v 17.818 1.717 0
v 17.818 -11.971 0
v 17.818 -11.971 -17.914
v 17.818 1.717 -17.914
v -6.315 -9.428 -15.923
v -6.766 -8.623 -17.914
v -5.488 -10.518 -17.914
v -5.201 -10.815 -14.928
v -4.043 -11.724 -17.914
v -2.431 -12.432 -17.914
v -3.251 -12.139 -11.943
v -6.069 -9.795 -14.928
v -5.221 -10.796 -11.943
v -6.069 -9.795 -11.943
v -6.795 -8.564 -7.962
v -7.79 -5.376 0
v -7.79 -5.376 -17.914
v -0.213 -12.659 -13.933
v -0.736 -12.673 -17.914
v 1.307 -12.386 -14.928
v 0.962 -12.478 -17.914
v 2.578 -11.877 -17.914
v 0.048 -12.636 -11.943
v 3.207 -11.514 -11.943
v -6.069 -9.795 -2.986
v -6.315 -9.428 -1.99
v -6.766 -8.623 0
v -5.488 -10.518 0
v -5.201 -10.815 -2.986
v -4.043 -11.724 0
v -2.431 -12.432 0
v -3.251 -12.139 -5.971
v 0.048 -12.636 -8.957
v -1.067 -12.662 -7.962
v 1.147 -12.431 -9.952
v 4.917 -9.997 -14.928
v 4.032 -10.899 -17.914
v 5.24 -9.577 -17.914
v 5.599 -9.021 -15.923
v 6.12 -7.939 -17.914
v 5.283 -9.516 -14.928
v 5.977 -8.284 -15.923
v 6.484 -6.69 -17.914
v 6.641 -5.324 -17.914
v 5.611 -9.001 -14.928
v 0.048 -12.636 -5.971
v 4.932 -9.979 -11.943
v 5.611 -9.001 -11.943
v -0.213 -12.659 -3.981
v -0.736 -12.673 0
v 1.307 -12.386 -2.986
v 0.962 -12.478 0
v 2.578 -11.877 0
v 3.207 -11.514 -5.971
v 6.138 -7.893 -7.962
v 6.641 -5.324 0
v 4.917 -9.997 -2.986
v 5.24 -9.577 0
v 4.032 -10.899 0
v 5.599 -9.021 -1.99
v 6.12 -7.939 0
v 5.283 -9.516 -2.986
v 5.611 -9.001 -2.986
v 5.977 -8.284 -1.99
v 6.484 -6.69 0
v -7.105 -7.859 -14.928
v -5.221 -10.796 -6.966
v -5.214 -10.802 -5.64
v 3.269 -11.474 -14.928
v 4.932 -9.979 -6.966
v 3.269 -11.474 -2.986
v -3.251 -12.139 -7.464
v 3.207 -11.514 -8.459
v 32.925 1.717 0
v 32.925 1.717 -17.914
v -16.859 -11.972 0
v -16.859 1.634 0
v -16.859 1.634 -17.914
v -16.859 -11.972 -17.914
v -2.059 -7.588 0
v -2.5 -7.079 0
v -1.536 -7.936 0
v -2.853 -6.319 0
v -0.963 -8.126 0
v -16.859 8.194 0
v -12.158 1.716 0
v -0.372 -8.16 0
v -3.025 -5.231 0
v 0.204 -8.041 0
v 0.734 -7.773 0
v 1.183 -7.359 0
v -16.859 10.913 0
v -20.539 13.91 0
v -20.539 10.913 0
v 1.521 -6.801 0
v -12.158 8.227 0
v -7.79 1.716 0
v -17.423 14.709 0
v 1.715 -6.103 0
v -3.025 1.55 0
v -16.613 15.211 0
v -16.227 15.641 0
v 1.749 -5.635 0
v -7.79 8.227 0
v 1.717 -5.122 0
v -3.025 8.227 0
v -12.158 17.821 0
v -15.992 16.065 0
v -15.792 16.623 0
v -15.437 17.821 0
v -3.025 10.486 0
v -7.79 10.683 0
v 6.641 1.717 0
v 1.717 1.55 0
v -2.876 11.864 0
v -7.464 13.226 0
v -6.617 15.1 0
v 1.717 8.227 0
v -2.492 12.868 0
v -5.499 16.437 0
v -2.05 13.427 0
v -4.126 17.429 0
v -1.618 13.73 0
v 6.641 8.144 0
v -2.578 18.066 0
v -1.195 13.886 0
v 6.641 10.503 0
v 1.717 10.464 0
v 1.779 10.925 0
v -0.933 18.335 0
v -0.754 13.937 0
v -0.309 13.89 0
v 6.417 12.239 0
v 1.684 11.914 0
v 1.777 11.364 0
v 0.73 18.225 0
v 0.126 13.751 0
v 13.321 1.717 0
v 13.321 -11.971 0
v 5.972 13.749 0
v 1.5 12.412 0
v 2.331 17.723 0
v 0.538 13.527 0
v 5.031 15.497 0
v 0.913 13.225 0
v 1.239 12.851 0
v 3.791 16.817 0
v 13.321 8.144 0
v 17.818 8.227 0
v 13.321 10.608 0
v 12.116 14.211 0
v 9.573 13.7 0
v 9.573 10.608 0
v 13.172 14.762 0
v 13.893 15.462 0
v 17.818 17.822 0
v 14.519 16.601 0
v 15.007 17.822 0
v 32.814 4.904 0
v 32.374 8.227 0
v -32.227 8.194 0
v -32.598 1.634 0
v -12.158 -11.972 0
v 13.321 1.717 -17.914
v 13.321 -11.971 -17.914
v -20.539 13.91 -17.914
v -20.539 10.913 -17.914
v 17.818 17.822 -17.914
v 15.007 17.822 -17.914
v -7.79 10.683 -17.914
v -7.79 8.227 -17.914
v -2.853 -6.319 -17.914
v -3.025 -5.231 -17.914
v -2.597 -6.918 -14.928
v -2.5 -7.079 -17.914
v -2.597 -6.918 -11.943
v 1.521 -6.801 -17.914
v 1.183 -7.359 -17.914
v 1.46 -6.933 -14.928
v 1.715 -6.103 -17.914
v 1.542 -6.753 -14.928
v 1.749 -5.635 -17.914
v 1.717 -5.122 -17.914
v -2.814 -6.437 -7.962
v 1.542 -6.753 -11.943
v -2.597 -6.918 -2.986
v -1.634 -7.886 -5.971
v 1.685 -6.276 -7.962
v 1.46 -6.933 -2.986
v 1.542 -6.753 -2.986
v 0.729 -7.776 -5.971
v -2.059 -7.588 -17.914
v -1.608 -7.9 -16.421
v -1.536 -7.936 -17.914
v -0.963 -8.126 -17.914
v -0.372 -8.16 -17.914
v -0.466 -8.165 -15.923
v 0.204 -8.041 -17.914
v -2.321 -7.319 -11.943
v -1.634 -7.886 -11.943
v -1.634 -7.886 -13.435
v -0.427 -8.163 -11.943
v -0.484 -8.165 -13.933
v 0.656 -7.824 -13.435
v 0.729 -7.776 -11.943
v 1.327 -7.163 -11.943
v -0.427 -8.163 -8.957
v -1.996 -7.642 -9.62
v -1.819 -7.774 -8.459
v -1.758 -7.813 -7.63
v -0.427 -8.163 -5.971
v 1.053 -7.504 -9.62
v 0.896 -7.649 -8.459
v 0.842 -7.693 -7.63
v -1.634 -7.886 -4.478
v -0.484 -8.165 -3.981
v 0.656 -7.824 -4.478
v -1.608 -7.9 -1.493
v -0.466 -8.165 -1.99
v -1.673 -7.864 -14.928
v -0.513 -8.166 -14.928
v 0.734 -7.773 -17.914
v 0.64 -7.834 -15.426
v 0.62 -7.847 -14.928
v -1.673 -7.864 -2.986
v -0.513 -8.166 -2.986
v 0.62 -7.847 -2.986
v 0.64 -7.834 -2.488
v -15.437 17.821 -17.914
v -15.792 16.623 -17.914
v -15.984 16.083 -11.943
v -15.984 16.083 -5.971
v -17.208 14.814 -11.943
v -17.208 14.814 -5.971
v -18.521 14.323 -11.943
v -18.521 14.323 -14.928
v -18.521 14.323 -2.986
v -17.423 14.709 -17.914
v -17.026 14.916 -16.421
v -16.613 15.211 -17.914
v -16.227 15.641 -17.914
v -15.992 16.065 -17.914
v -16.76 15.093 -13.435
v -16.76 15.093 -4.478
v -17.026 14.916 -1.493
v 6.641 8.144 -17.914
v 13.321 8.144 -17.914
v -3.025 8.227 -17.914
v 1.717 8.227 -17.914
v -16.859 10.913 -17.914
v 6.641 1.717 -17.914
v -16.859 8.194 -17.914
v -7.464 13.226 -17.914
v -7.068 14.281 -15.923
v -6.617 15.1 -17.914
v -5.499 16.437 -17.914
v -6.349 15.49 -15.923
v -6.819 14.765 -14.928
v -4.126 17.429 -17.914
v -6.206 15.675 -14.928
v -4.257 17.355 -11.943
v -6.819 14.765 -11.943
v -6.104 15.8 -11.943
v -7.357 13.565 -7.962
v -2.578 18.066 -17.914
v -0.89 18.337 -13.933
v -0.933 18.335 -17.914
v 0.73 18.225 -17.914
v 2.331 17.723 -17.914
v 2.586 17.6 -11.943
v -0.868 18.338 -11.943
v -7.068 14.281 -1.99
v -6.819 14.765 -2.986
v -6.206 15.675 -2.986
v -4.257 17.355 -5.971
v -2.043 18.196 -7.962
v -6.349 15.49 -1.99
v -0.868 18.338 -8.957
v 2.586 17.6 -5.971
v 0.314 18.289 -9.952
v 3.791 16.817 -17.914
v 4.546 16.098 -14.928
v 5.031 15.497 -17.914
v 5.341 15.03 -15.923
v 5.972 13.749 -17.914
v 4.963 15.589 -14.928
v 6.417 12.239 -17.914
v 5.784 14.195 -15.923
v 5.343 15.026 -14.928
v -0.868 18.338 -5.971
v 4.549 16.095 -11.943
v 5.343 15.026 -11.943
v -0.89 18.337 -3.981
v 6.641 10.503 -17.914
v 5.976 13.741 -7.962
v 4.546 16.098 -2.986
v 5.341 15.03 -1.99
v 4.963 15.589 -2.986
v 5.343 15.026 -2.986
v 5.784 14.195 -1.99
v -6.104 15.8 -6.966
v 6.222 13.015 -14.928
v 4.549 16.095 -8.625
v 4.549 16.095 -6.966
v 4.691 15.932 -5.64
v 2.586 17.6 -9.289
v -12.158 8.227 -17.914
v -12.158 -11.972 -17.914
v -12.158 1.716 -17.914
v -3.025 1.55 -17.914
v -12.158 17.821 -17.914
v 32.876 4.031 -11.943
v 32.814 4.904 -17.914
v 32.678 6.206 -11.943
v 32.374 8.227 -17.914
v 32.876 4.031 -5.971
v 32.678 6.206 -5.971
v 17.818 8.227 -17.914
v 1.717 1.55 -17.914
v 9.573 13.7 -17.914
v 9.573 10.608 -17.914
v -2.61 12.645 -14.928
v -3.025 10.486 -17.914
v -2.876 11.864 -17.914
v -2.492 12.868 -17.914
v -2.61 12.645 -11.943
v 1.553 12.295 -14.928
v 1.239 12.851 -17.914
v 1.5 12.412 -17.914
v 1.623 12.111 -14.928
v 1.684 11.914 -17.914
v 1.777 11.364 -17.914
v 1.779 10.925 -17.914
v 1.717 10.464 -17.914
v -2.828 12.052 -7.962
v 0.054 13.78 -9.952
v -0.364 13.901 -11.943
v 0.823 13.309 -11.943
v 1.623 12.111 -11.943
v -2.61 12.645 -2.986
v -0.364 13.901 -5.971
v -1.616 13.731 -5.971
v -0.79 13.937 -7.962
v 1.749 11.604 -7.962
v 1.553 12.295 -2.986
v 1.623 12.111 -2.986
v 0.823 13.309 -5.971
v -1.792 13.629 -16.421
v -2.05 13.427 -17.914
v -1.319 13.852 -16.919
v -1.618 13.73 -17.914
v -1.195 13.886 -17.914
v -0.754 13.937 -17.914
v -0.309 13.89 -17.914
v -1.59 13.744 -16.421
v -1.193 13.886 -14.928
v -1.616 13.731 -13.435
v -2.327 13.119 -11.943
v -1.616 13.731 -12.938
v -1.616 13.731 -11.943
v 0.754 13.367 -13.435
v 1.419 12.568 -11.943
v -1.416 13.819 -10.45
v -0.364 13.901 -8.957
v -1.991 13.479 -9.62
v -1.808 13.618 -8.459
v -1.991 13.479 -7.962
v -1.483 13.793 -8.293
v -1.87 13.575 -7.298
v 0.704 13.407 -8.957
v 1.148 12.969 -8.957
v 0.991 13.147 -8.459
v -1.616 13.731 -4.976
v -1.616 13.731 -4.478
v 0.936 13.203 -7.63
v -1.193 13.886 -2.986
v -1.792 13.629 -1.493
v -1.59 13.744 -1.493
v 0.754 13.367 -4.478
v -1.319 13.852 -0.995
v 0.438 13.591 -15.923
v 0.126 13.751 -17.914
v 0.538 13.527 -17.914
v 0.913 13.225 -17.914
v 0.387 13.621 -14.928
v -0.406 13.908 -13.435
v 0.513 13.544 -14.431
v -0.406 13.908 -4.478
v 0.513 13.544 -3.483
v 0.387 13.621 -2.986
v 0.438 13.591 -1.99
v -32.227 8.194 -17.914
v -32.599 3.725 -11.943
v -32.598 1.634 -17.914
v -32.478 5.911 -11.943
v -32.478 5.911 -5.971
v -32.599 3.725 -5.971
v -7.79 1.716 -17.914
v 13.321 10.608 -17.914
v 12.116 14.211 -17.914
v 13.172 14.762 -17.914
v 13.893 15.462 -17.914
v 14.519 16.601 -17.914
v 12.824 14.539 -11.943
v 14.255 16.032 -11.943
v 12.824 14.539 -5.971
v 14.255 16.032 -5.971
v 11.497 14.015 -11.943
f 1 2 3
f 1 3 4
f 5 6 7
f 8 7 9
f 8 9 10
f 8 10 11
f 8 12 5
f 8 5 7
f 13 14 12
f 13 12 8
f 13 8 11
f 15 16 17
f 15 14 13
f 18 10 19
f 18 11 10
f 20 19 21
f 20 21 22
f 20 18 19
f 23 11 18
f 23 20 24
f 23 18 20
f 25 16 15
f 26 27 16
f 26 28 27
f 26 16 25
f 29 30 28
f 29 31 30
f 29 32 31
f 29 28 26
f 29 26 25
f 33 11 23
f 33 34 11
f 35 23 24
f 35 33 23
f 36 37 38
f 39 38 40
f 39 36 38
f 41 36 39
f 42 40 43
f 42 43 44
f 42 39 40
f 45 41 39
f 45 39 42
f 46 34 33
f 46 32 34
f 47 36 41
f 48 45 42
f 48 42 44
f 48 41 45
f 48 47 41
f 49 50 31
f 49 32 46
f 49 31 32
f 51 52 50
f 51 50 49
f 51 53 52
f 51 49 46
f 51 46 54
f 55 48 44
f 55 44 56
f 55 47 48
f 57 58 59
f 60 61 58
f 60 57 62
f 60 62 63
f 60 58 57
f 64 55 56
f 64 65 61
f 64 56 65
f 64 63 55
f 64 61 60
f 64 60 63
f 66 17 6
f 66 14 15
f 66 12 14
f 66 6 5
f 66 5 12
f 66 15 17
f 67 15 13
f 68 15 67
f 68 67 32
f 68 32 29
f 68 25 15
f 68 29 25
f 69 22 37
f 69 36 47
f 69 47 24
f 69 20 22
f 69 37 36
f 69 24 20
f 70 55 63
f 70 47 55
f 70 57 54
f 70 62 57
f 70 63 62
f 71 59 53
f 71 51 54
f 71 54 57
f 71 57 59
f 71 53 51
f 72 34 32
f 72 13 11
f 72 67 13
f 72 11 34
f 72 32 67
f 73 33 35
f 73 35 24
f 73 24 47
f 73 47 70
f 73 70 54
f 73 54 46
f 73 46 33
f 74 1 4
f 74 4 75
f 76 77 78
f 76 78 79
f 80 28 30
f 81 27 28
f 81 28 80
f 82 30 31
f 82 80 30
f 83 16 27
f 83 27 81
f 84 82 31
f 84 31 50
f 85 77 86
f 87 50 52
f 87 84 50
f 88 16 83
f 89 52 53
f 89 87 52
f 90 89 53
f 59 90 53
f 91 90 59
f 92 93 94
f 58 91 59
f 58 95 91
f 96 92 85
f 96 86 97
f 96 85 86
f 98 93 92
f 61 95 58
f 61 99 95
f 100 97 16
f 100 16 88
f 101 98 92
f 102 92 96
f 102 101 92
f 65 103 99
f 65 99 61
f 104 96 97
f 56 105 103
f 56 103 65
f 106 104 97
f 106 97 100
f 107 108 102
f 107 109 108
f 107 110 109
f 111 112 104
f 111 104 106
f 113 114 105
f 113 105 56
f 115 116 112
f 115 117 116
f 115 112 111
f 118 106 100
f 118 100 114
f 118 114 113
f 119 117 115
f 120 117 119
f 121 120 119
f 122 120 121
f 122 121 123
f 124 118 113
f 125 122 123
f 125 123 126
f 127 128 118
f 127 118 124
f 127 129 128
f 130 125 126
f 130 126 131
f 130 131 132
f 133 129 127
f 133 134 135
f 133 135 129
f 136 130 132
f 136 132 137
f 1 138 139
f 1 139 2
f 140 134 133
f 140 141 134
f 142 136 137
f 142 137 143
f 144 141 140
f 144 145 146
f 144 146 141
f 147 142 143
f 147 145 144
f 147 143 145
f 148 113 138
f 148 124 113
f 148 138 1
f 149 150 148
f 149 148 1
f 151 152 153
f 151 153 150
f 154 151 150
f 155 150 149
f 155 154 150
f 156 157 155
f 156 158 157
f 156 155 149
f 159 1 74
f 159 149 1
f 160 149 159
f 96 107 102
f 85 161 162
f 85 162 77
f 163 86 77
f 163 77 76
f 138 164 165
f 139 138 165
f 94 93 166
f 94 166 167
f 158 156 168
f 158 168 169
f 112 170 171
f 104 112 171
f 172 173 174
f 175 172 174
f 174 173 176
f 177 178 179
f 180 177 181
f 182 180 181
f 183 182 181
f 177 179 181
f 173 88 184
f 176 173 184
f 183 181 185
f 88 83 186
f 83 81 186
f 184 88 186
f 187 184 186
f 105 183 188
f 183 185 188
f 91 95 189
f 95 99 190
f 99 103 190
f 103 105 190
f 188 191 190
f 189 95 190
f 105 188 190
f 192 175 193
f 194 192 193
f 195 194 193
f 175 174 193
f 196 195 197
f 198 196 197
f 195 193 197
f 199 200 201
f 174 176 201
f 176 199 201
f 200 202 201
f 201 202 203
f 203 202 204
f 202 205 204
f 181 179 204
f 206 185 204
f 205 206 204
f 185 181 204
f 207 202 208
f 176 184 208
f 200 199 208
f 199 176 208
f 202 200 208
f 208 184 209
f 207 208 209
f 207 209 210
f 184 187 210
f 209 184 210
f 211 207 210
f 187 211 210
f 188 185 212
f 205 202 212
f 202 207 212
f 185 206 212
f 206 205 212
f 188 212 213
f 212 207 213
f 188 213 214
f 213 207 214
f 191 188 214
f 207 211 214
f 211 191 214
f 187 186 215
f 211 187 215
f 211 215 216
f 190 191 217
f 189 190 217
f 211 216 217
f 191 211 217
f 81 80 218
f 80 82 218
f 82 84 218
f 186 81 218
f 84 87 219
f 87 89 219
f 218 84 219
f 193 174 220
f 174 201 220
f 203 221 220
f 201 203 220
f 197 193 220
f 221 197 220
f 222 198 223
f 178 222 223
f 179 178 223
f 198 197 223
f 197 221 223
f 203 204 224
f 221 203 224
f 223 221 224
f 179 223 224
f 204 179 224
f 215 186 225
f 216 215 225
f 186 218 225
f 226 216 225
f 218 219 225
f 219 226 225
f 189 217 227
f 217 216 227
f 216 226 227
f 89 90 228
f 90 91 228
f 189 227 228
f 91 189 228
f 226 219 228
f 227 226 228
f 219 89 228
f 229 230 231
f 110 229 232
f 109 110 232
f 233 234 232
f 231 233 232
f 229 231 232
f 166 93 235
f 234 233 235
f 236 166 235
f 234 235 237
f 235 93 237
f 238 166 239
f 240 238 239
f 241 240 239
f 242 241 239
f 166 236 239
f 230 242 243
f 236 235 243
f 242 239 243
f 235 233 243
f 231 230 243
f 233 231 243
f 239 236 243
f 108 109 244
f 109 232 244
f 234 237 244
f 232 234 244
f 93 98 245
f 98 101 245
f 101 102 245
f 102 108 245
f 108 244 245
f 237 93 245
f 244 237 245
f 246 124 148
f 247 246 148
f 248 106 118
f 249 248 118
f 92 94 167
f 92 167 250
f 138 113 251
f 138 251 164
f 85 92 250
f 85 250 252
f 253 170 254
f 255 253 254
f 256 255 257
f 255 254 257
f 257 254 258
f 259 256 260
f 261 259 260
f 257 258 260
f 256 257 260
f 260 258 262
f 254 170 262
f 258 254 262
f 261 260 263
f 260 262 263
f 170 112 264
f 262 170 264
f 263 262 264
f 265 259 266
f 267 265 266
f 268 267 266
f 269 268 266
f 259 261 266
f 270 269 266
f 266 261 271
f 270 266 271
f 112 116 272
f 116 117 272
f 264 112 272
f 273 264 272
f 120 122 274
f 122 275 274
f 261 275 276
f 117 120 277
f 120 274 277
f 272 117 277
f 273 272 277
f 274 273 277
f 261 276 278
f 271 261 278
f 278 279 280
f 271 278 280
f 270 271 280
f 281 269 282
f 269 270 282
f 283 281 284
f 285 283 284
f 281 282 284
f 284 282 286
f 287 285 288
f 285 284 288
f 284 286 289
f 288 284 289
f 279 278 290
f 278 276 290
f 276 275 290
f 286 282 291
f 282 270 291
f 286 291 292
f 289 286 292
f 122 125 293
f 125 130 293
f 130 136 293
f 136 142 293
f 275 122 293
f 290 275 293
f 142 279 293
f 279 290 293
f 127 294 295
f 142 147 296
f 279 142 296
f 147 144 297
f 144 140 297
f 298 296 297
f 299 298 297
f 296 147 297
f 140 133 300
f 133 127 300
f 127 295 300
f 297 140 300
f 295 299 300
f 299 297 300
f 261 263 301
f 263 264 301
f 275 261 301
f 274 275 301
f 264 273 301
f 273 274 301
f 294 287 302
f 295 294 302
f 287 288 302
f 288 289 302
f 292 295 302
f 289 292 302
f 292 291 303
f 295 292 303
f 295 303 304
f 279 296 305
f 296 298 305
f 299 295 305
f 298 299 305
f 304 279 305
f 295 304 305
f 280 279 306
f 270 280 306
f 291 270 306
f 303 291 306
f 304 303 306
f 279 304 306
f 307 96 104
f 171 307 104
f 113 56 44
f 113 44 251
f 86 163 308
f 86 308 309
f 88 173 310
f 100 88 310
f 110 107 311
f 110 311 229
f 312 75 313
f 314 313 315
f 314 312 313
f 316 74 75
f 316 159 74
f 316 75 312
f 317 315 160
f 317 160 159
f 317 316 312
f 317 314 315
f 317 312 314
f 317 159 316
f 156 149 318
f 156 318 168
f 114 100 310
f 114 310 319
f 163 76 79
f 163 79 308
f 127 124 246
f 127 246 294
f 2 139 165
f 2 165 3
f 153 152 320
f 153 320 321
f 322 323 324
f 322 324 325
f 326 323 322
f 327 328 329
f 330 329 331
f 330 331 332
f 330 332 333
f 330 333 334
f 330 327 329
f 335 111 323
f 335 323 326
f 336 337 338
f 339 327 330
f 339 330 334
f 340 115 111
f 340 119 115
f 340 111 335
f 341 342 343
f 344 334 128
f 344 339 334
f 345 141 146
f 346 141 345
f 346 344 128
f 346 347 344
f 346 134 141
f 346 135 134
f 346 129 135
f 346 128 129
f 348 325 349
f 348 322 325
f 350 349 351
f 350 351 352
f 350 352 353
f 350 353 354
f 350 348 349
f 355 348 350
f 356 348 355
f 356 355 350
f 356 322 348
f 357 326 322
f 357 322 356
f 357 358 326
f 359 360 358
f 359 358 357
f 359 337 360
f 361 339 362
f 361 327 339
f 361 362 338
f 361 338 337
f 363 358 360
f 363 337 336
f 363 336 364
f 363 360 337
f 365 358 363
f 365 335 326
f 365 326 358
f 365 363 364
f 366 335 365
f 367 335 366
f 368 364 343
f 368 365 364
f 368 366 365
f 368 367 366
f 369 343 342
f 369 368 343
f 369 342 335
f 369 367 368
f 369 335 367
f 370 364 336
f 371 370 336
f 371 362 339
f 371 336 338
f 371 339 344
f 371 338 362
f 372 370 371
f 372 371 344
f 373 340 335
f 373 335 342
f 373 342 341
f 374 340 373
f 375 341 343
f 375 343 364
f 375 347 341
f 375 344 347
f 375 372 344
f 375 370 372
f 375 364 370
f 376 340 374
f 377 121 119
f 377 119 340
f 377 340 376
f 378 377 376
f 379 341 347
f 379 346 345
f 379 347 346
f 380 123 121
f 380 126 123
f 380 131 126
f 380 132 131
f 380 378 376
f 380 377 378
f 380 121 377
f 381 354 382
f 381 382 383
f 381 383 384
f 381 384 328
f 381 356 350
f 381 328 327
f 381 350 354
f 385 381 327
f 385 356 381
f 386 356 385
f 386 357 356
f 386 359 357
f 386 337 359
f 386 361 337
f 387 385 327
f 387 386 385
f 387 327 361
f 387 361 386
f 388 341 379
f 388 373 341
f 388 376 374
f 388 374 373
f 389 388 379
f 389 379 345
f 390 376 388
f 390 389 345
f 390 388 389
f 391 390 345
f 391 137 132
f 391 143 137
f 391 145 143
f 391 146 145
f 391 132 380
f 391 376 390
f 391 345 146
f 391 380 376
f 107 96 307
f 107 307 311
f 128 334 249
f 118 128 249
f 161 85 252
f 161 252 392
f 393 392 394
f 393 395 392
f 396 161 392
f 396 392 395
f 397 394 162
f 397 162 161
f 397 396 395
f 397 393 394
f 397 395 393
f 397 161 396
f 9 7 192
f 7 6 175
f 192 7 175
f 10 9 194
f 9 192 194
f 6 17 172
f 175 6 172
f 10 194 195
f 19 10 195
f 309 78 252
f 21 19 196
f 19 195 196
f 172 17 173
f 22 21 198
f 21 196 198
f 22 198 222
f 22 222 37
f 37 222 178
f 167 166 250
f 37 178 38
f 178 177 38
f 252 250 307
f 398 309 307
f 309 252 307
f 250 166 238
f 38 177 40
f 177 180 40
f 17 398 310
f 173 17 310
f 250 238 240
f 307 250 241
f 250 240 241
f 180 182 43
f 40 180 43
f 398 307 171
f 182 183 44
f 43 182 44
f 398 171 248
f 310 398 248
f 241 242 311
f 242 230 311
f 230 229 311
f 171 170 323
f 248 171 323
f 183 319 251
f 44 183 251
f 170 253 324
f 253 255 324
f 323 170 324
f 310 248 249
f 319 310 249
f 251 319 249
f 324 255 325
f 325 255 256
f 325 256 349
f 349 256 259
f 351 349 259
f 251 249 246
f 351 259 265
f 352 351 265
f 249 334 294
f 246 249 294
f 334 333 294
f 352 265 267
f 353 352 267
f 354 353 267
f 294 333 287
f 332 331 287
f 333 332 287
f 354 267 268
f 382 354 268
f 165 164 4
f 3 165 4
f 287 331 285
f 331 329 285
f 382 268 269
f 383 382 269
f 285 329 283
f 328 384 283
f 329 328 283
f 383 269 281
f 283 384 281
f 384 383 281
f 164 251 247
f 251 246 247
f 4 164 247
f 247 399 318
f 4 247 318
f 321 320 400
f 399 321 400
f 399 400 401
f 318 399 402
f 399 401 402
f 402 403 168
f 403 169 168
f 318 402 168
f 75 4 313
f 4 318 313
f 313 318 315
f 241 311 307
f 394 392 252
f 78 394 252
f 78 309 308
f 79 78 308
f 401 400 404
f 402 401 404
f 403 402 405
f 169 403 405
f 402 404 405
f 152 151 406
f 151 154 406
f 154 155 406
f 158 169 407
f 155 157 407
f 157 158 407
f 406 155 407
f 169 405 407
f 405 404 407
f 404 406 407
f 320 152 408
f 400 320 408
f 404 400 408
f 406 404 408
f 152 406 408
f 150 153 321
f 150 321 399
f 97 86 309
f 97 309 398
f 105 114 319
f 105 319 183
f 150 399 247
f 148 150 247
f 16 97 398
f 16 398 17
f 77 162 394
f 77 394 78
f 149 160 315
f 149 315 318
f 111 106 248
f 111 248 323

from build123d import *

# Parameters (mm, degrees)
F0_W     = 6.6796690226
F0_H     = 6.4269647701
F0_W_2   = 4.7415380832
F0_H_2   = 6.6773667932
F0_W_3   = 4.3679763669
F0_H_3   = 6.5104326932
F3_DEPTH = 17.91377


# Not quite as in the source:
# - a feature of the source that left no trace in its solid (it failed there, or was rolled back) is left out


with BuildPart() as f3:
    # F0 (on Top) → F3 (new body)
    with BuildSketch(Plane.XY):
        with BuildLine():
            Line((-7.7901906334, 10.6832636405), (-7.7901906334, 8.2267736901))
            Line((-7.7901906334, 8.2267736901), (-7.7901906334, 1.7163409969))
            Line((-7.7901906334, 1.7163409969), (-7.7901906334, -5.3760232519))
            add(Edge.make_bspline(
                [(-7.7901906334, -5.3760232519), (-5.8573922142, -16.4409913238), (6.3671558164, -13.6890839785), (6.6410573199, -5.3240084089)],
                knots=[0, 0, 0, 0, 14.4313416921, 14.4313416921, 14.4313416921, 14.4313416921], degree=3))
            Line((6.6410573199, -5.3240084089), (6.6410573199, 1.7169426428))
            Line((6.6410573199, 1.7169426428), (6.6410573199, 8.1439074129))
            Line((6.6410573199, 8.1439074129), (6.6410573199, 10.5028618127))
            add(Edge.make_bspline(
                [(-7.7901906334, 10.6832636405), (-7.9460730776, 20.2635042254), (6.0135321692, 21.5757451952), (6.6410573199, 10.5028618127)],
                knots=[0, 0, 0, 0, 14.4323754909, 14.4323754909, 14.4323754909, 14.4323754909], degree=3))
        make_face()
        with BuildLine():
            Line((-3.0246356037, 8.227375336), (-3.0246356037, 10.4858698323))
            add(Edge.make_bspline(
                [(-3.0246356037, 10.4858698323), (-2.9879831709, 15.9807316959), (2.4520969018, 14.104841277), (1.7169024795, 10.4636372998)],
                knots=[0, 0, 0, 0, 4.7415902058, 4.7415902058, 4.7415902058, 4.7415902058], degree=3))
            Line((1.7169024795, 10.4636372998), (1.7169024795, 8.227375336))
            Line((1.7169024795, 8.227375336), (1.7169024795, 1.5500085428))
            Line((1.7169024795, 1.5500085428), (1.7169024795, -5.1218802109))
            add(Edge.make_bspline(
                [(-3.0246356037, -5.2313073538), (-2.9015108012, -9.3426071107), (2.1988428198, -8.9745400473), (1.7169024795, -5.1218802109)],
                knots=[0, 0, 0, 0, 4.7428006171, 4.7428006171, 4.7428006171, 4.7428006171], degree=3))
            Line((-3.0246356037, -5.2313073538), (-3.0246356037, 1.5500085428))
            Line((-3.0246356037, 1.5500085428), (-3.0246356037, 8.227375336))
        make_face(mode=Mode.SUBTRACT)
        with BuildLine():
            add(Edge.make_bspline(
                [(-20.5391882093, 13.9101054404), (-15.6776210399, 14.6662937362), (-16.1226423563, 15.8139783774), (-15.4372690351, 17.8214814399)],
                knots=[0, 0, 0, 0, 6.4287200491, 6.4287200491, 6.4287200491, 6.4287200491], degree=3))
            Line((-20.5391882093, 13.9101054404), (-20.5391882093, 10.912990186))
            Line((-20.5391882093, 10.912990186), (-16.858519438, 10.912990186))
            Line((-16.858519438, 10.912990186), (-16.858519438, 8.1935095558))
            Line((-16.858519438, 8.1935095558), (-16.858519438, 1.6338703002))
            Line((-16.858519438, 1.6338703002), (-16.858519438, -11.9715025764))
            Line((-16.858519438, -11.9715025764), (-12.1581670002, -11.9715025764))
            Line((-12.1581670002, -11.9715025764), (-12.1581670002, 1.7163409969))
            Line((-12.1581670002, 1.7163409969), (-12.1581670002, 8.2267736901))
            Line((-12.1581670002, 8.2267736901), (-12.1581670002, 17.8214814399))
            Line((-12.1581670002, 17.8214814399), (-15.4372690351, 17.8214814399))
        make_face()
        with BuildLine():
            Line((13.3207263425, 10.6080584228), (13.3207263425, 8.1439074129))
            Line((13.3207263425, 8.1439074129), (13.3207263425, 1.7169426428))
            Line((13.3207263425, 1.7169426428), (13.3207263425, -11.9709009305))
            Line((13.3207263425, -11.9709009305), (17.8177803755, -11.9709009305))
            Line((17.8177803755, -11.9709009305), (17.8177803755, 1.7169426428))
            Line((17.8177803755, 1.7169426428), (17.8177803755, 8.227375336))
            Line((17.8177803755, 8.227375336), (17.8177803755, 17.8220830858))
            Line((17.8177803755, 17.8220830858), (15.0071214885, 17.8220830858))
            add(Edge.make_bspline(
                [(9.5731783658, 13.6997830123), (14.1142597422, 14.0927145258), (14.2135191709, 16.0034615546), (15.0071214885, 17.8220830858)],
                knots=[0, 0, 0, 0, 6.820637489, 6.820637489, 6.820637489, 6.820637489], degree=3))
            Line((9.5731783658, 13.6997830123), (9.5731783658, 10.6080584228))
            Line((9.5731783658, 10.6080584228), (13.3207263425, 10.6080584228))
        make_face()
        with BuildLine():
            Line((-16.858519438, 1.6338703002), (-16.858519438, 8.1935095558))
            Line((-16.858519438, 8.1935095558), (-32.2274787855, 8.1935095558))
            add(Edge.make_bspline(
                [(-32.2274787855, 8.1935095558), (-32.5451358574, 5.8624682682), (-32.6565323778, 3.6785873351), (-32.5981434394, 1.6338703002)],
                knots=[2.9954620198, 2.9954620198, 2.9954620198, 2.9954620198, 7.0566986479, 7.0566986479, 7.0566986479, 7.0566986479], degree=3))
            Line((-32.5981434394, 1.6338703002), (-16.858519438, 1.6338703002))
        make_face()
        with BuildLine():
            Line((17.8177803755, 1.7169426428), (32.925114671, 1.7169426428))
            add(Edge.make_bspline(
                [(32.925114671, 1.7169426428), (32.9640628967, 4.0950280506), (32.7178774406, 6.2881527237), (32.3742319383, 8.227375336)],
                knots=[25.2691995487, 25.2691995487, 25.2691995487, 25.2691995487, 32.9729040179, 32.9729040179, 32.9729040179, 32.9729040179], degree=3))
            Line((32.3742319383, 8.227375336), (17.8177803755, 8.227375336))
            Line((17.8177803755, 8.227375336), (17.8177803755, 1.7169426428))
        make_face()
        with Locations((9.9808918312, 4.9304250279)):
            Rectangle(F0_W, F0_H)
        with Locations((-0.6538665621, 4.8886919394)):
            Rectangle(F0_W_2, F0_H_2)
        with Locations((-9.9741788168, 4.9715573435)):
            Rectangle(F0_W_3, F0_H_3)
    extrude(amount=-F3_DEPTH)


solid = f3.part
